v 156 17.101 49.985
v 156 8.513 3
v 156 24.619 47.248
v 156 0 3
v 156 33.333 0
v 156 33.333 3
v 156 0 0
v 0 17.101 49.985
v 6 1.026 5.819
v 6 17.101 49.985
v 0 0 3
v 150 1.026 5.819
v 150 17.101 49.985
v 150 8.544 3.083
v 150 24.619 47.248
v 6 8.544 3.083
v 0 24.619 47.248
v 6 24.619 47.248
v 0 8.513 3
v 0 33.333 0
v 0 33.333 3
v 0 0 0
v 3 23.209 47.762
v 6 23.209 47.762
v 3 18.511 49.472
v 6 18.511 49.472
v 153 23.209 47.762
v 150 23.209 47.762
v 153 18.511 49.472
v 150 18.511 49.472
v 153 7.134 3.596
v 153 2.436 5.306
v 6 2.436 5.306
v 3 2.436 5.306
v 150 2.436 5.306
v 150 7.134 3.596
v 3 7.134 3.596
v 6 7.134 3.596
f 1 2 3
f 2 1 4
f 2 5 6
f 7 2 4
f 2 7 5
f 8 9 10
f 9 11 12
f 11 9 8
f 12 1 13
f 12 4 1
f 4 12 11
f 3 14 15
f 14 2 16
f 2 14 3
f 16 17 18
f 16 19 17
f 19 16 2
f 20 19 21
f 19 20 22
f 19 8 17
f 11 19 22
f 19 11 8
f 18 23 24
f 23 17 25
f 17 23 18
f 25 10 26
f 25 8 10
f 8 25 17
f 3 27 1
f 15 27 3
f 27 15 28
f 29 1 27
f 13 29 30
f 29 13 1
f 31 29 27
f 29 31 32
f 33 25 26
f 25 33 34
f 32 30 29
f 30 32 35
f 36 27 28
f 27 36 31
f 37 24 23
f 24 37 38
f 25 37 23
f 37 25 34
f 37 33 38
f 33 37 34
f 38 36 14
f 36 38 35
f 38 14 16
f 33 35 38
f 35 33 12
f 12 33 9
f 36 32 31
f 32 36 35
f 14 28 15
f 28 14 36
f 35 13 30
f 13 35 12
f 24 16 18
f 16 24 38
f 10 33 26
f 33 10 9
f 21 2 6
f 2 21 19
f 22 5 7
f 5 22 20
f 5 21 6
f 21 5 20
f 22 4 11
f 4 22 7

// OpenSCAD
mobile_width = 150;
mobile_height = 50;
mobile_depth = 5;

wall_thickness = 3;
angle = 70;

cube([mobile_width+2*wall_thickness,mobile_height/1.5,wall_thickness]);

translate([0,0,wall_thickness])
rotate([angle,0,0])
translate([0,0,-wall_thickness-mobile_depth])

difference() {
cube([mobile_width+2*wall_thickness,mobile_height,wall_thickness+mobile_depth]);
translate([wall_thickness,wall_thickness,0.5*wall_thickness])cube([mobile_width,mobile_height,mobile_depth]);
translate([wall_thickness*2,wall_thickness,0])cube([mobile_width-2*wall_thickness,mobile_height,mobile_depth*4]);
}
